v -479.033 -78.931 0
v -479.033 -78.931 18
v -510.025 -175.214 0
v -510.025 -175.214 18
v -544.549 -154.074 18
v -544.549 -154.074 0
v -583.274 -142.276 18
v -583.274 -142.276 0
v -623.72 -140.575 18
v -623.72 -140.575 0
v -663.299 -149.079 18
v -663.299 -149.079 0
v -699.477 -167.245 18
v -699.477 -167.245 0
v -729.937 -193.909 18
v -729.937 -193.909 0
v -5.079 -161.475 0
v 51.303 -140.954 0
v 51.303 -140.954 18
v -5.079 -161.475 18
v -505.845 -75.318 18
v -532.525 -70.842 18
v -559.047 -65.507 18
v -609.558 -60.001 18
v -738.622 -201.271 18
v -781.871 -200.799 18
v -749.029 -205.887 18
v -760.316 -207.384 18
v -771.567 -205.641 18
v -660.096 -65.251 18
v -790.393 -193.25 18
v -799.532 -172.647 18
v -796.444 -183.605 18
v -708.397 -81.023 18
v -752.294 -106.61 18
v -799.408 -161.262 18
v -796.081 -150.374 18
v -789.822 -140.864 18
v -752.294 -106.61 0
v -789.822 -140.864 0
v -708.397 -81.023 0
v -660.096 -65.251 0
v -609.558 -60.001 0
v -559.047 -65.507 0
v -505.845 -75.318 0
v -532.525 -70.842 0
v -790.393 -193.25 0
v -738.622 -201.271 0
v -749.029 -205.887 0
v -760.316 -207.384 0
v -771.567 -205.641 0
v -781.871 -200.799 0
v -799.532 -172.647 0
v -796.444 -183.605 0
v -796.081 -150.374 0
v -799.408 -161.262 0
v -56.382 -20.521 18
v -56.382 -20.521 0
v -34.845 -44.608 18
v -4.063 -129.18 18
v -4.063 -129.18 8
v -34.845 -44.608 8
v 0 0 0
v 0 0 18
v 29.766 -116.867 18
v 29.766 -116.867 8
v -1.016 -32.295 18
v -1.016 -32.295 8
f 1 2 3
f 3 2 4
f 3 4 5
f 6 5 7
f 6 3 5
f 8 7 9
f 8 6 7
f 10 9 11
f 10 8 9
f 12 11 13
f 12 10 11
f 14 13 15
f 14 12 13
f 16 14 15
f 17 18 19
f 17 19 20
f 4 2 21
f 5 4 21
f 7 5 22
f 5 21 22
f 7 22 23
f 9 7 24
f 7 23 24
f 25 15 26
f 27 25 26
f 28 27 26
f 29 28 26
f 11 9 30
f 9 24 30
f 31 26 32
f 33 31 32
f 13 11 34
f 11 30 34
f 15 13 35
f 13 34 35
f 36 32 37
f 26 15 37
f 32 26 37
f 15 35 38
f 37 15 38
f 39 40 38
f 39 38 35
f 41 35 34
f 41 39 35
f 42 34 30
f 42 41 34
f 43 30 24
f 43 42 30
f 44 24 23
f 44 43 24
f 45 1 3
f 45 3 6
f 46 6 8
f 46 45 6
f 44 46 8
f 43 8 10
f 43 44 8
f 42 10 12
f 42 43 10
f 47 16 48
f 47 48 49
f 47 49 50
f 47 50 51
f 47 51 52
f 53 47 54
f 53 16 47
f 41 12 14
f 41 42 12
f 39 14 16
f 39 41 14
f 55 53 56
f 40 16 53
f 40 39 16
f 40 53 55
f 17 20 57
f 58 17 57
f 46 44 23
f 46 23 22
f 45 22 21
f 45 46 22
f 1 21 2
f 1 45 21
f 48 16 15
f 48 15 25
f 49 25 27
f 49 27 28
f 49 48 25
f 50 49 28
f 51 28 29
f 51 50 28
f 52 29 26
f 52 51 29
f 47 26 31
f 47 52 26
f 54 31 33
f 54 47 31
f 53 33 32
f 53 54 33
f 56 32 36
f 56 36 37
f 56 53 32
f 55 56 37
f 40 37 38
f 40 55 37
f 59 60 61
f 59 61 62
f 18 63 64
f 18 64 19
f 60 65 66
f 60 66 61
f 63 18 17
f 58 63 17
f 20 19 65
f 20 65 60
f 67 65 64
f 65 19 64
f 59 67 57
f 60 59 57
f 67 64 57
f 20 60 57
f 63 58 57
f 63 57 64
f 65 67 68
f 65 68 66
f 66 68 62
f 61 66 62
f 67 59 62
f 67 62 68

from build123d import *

# Parameters (mm, degrees)
BOSS_EXTRUDE1_DEPTH = 18
SKETCH2_W           = 200
SKETCH2_H           = 97
CUT_EXTRUDE1_DEPTH  = 19
CUT_EXTRUDE2_DEPTH  = 19
CUT_EXTRUDE3_DEPTH  = 10


with BuildPart() as part:
    # Sketch1 → Boss-Extrude1 (new body)
    with BuildSketch(Plane.XY):
        with BuildLine():
            Line((0, 0), (51.303021499, -140.953893118))
            Line((51.303021499, -140.953893118), (-5.078535748, -161.475101717))
            ThreePointArc((-5.078535748, -161.475101717), (-59.282744504, -247.94612641), (-59.866905015, -350))
            Line((-59.866905015, -350), (-458.18031046, -350))
            ThreePointArc((-458.18031046, -350), (-530.476755656, -161.257646224), (-729.936822659, -193.909350133))
            ThreePointArc((-729.936822659, -193.909350133), (-786.401902791, -197.329105332), (-789.82165799, -140.864025199))
            ThreePointArc((-789.82165799, -140.864025199), (-684.665051265, -71.855170989), (-559.047216388, -65.507458149))
            ThreePointArc((-559.047216388, -65.507458149), (-324.287619955, -82.844559906), (-93.969262079, -34.202014333))
            Line((-93.969262079, -34.202014333), (0, 0))
        make_face()
    extrude(amount=BOSS_EXTRUDE1_DEPTH)

    # Sketch2 → Cut-Extrude1 (cut, through all)
    with BuildSketch(Plane.XY.offset(18)):
        with Locations((-187.508312236, -266.5)):
            Rectangle(SKETCH2_W, SKETCH2_H)
        with BuildLine():
            Line((-322.508312236, -315), (-432.508312236, -315))
            Line((-432.508312236, -315), (-432.508312236, -255))
            ThreePointArc((-432.508312236, -255), (-377.508312236, -200), (-322.508312236, -255))
            Line((-322.508312236, -255), (-322.508312236, -315))
        make_face()
    extrude(amount=-CUT_EXTRUDE1_DEPTH, mode=Mode.SUBTRACT)

    # Sketch4 → Cut-Extrude2 (cut, through all)
    with BuildSketch(Plane.XY.offset(18)):
        Polygon((-5.078535748, -161.475101717), (-84.826670929, 57.631098935), (-457.092499605, -10.764738535), (-587.040553494, -414.486123748), (5.988618542, -394.516024731), align=None)
    extrude(amount=-CUT_EXTRUDE2_DEPTH, mode=Mode.SUBTRACT)

    # Sketch3 → Cut-Extrude3 (cut)
    with BuildSketch(Plane.XY.offset(18)):
        Polygon((-1.01570715, -32.295020343), (29.76610575, -116.867356214), (-4.062828599, -129.180081374), (-34.844641498, -44.607745503), align=None)
    extrude(amount=-CUT_EXTRUDE3_DEPTH, mode=Mode.SUBTRACT)


solid = part.part
